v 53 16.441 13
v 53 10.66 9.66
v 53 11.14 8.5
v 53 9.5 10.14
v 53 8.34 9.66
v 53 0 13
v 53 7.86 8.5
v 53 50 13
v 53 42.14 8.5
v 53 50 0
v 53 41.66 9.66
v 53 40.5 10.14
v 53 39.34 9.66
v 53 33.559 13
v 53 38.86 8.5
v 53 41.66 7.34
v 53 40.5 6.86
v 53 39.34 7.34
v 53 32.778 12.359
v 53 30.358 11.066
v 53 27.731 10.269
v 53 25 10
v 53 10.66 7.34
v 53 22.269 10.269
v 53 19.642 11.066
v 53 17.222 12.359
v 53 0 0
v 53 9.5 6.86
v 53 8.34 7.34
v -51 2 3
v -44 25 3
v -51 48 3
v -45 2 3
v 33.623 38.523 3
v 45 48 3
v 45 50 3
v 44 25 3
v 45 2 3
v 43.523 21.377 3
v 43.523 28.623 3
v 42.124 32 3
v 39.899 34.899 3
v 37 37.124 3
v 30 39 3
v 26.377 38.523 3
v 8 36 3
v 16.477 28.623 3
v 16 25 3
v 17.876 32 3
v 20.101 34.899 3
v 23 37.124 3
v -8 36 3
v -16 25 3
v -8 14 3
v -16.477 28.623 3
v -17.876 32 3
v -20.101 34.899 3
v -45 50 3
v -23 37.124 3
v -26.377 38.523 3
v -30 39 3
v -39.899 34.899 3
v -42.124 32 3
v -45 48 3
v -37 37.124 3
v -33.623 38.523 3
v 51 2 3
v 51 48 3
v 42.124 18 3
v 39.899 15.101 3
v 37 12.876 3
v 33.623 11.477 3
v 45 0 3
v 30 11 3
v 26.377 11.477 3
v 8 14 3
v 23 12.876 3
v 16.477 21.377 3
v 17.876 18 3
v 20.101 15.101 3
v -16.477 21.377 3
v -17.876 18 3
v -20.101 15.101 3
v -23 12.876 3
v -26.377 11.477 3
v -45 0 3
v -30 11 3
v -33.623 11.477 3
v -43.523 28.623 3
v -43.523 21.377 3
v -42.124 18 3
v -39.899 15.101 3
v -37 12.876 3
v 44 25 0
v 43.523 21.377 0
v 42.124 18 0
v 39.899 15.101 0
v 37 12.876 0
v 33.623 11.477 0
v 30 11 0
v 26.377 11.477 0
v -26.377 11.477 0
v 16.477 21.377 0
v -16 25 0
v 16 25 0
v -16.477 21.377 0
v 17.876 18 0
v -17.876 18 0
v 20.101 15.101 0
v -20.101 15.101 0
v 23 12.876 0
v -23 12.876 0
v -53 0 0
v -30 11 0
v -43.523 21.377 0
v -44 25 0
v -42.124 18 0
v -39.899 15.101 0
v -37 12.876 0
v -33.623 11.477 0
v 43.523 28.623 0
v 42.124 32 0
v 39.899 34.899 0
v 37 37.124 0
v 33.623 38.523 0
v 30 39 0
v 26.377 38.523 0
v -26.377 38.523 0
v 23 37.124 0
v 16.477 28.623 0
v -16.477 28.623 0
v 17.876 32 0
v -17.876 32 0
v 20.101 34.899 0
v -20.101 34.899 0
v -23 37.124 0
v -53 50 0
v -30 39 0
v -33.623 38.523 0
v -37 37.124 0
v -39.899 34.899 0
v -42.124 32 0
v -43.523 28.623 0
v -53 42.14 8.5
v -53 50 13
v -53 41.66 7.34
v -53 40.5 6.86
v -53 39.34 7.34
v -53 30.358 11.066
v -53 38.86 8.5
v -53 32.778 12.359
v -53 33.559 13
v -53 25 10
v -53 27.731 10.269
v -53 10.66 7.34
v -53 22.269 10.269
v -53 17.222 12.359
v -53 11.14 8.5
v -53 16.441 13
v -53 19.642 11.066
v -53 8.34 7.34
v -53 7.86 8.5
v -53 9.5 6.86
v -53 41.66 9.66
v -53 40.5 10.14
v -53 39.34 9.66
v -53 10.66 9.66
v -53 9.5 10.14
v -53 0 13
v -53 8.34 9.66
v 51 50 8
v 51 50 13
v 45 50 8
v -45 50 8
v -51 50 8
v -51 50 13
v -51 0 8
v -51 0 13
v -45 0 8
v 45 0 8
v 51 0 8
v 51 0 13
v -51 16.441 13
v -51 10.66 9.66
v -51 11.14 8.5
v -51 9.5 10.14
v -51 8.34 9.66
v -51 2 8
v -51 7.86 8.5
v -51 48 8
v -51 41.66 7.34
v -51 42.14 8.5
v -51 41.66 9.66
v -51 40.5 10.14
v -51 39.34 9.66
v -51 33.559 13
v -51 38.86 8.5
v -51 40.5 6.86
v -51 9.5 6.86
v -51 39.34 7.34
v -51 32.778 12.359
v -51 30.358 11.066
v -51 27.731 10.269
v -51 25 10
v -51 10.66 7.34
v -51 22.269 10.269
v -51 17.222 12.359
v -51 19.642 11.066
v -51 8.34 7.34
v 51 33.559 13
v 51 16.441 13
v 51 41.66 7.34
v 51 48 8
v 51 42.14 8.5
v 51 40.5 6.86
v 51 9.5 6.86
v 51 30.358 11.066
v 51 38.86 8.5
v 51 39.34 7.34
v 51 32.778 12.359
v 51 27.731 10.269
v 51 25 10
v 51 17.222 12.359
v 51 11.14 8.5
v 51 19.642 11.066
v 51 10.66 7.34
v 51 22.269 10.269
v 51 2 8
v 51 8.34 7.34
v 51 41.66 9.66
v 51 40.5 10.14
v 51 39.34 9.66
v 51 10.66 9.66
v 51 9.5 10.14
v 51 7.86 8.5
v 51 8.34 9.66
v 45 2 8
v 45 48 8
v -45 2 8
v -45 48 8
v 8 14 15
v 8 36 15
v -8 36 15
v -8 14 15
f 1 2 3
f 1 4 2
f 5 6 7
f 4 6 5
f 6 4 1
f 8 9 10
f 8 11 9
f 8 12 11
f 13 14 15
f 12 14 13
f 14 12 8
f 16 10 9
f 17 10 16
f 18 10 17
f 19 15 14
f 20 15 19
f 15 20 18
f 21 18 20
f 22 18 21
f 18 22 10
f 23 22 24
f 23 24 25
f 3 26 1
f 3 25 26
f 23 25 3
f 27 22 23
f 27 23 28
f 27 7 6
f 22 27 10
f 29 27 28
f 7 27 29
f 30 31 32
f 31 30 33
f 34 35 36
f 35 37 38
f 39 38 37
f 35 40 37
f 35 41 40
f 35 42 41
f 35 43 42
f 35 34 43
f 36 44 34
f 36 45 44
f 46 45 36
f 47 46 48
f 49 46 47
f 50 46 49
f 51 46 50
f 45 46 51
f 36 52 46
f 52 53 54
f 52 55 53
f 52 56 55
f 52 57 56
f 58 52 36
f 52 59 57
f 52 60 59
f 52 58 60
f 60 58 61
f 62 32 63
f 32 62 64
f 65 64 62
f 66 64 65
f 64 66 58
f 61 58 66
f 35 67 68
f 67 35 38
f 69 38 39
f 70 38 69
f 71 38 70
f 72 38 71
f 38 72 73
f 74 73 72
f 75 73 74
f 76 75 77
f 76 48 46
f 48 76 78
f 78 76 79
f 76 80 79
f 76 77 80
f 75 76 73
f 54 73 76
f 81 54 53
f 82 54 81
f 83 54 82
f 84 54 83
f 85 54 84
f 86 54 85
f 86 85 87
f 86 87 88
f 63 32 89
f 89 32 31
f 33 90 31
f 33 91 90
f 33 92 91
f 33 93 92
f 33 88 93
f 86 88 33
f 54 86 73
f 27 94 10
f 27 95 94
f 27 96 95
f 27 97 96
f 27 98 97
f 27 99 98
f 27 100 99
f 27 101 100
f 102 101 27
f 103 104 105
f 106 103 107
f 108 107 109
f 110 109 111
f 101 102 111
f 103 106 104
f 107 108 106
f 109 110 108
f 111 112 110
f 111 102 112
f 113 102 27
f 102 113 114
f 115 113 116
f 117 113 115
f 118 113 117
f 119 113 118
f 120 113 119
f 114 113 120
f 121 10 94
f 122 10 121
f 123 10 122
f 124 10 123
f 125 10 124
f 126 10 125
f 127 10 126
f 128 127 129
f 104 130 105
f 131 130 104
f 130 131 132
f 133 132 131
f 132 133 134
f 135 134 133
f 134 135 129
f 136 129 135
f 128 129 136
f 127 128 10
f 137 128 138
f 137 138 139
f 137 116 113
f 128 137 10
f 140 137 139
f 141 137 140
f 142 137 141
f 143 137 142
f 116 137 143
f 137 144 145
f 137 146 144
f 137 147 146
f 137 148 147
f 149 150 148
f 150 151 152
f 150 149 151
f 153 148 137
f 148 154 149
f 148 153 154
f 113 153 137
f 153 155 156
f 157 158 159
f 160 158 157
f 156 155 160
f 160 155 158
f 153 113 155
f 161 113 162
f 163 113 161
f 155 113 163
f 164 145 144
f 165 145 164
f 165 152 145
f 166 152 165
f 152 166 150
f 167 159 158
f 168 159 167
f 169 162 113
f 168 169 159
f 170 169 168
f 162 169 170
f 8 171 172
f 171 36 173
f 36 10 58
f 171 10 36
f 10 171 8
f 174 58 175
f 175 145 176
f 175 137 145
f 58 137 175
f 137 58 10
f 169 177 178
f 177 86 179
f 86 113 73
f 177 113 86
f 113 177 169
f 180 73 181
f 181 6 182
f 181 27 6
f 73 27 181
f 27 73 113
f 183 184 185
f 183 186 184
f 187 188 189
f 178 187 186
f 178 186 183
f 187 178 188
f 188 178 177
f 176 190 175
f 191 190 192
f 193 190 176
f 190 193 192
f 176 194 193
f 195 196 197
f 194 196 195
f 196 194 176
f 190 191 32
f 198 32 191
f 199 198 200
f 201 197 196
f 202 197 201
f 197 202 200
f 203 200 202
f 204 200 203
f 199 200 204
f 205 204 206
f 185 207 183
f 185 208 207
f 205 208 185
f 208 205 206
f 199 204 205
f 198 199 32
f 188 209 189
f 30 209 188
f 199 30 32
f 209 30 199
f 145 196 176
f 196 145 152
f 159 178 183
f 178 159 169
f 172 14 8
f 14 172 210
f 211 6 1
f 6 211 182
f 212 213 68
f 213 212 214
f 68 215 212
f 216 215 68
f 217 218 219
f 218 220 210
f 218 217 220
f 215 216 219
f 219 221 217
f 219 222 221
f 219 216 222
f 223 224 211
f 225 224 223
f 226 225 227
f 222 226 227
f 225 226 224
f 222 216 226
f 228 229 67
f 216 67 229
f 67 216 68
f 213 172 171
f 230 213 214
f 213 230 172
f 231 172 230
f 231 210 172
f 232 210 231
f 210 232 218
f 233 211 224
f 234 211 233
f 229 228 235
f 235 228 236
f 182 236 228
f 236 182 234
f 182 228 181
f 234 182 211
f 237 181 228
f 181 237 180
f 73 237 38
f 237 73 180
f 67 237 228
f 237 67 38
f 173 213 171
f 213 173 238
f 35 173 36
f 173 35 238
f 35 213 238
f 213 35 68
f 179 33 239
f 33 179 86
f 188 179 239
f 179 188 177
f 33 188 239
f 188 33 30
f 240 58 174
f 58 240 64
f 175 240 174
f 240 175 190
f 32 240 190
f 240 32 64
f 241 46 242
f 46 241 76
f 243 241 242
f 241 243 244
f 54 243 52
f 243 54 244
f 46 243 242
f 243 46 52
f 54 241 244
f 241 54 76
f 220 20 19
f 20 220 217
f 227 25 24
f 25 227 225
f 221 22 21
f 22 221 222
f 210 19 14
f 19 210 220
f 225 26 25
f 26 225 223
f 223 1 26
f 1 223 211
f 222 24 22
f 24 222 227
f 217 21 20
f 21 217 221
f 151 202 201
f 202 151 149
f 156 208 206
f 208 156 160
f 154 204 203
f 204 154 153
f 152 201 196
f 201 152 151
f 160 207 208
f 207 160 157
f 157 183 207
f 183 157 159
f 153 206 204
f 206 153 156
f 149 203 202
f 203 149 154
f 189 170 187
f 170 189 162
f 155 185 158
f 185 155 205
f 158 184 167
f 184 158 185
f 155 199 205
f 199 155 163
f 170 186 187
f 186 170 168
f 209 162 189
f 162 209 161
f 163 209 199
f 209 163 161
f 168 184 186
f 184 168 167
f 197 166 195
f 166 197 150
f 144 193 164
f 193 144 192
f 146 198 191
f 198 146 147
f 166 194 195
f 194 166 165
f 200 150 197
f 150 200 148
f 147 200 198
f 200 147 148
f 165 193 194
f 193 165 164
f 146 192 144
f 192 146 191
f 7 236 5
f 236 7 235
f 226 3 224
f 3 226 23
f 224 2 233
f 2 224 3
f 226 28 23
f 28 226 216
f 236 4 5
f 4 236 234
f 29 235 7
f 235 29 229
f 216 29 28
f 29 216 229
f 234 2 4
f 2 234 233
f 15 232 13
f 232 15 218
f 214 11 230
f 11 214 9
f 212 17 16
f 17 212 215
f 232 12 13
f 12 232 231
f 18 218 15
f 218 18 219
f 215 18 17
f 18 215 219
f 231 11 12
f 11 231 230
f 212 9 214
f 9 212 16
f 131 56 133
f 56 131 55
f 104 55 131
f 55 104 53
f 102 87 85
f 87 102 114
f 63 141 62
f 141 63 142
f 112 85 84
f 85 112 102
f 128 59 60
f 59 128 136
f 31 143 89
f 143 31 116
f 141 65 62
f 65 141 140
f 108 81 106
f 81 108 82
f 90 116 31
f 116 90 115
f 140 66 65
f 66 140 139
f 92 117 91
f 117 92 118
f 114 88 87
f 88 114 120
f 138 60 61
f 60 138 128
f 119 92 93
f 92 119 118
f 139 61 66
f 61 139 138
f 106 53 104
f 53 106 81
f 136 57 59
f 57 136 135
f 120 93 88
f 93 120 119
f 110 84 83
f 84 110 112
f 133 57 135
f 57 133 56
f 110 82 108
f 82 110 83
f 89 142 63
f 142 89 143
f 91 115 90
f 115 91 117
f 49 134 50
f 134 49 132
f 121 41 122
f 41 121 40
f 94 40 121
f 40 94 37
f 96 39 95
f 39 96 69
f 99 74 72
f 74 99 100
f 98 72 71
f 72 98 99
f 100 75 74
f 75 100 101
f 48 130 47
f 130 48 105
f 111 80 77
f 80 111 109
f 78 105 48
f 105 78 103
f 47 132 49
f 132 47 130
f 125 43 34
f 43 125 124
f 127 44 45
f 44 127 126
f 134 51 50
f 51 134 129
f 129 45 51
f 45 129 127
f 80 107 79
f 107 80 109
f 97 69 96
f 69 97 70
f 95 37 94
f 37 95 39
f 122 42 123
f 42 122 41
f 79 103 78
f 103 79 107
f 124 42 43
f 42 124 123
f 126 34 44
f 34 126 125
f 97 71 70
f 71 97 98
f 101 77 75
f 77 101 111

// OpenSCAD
// file: dimensions.scad
// Originally created by Jose Julio
// https://github.com/JJulio/b-robot

SHARED_HEIGHT = 140;
SHARED_LENGTH = 102;
SHARED_WIDTH  = 50;
// main file
// Originally created by Jose Julio
// https://github.com/JJulio/b-robot

include <dimensions.scad>;

module base_plate()
{
  translate([-(SHARED_LENGTH+4)/2,0,0]) cube([SHARED_LENGTH+4,SHARED_WIDTH,3]);
  translate([-(SHARED_LENGTH+4)/2,0,0]) cube([2,SHARED_WIDTH,3+10]);
  translate([(SHARED_LENGTH+4)/2-2,0,0]) cube([2,SHARED_WIDTH,3+10]);

  translate([(SHARED_LENGTH+4)/2-8,0,0]) cube([8,2,8]);
  translate([(SHARED_LENGTH+4)/2-8,SHARED_WIDTH-2,0]) cube([8,2,8]);
  translate([-(SHARED_LENGTH+4)/2,0,0]) cube([8,2,8]);
  translate([-(SHARED_LENGTH+4)/2,SHARED_WIDTH-2,0]) cube([8,2,8]);

  translate([-8,(SHARED_WIDTH/2)-11,0]) cube([16,22,15]);

}

module base_plate_holes()
{
  // Motor shaft hole
  translate([SHARED_LENGTH/2,SHARED_WIDTH/2,24]) rotate([0,90,0]) cylinder(r=14,h=10,$fn=32,center=true);
  translate([-SHARED_LENGTH/2,SHARED_WIDTH/2,24]) rotate([0,90,0]) cylinder(r=14,h=10,$fn=32,center=true);

  // Motor mount holes
  translate([-(SHARED_LENGTH+4)/2,9.5,5.5+3]) rotate([0,90,0]) cylinder(r=1.64,h=10,$fn=8,center=true);
  translate([-(SHARED_LENGTH+4)/2,9.5+31,5.5+3]) rotate([0,90,0]) cylinder(r=1.64,h=10,$fn=8,center=true);
  translate([(SHARED_LENGTH+4)/2,9.5,5.5+3]) rotate([0,90,0]) cylinder(r=1.64,h=10,$fn=8,center=true);
  translate([(SHARED_LENGTH+4)/2,9.5+31,5.5+3]) rotate([0,90,0]) cylinder(r=1.64,h=10,$fn=8,center=true);

  //translate([0,SHARED_WIDTH/2,0]) cylinder(r=12,h=10,$fn=24,center=true);
  translate([-30,SHARED_WIDTH/2,0]) cylinder(r=14,h=10,$fn=24,center=true);
  translate([30,SHARED_WIDTH/2,0]) cylinder(r=14,h=10,$fn=24,center=true);
}


difference()
{
base_plate();
base_plate_holes();
}
